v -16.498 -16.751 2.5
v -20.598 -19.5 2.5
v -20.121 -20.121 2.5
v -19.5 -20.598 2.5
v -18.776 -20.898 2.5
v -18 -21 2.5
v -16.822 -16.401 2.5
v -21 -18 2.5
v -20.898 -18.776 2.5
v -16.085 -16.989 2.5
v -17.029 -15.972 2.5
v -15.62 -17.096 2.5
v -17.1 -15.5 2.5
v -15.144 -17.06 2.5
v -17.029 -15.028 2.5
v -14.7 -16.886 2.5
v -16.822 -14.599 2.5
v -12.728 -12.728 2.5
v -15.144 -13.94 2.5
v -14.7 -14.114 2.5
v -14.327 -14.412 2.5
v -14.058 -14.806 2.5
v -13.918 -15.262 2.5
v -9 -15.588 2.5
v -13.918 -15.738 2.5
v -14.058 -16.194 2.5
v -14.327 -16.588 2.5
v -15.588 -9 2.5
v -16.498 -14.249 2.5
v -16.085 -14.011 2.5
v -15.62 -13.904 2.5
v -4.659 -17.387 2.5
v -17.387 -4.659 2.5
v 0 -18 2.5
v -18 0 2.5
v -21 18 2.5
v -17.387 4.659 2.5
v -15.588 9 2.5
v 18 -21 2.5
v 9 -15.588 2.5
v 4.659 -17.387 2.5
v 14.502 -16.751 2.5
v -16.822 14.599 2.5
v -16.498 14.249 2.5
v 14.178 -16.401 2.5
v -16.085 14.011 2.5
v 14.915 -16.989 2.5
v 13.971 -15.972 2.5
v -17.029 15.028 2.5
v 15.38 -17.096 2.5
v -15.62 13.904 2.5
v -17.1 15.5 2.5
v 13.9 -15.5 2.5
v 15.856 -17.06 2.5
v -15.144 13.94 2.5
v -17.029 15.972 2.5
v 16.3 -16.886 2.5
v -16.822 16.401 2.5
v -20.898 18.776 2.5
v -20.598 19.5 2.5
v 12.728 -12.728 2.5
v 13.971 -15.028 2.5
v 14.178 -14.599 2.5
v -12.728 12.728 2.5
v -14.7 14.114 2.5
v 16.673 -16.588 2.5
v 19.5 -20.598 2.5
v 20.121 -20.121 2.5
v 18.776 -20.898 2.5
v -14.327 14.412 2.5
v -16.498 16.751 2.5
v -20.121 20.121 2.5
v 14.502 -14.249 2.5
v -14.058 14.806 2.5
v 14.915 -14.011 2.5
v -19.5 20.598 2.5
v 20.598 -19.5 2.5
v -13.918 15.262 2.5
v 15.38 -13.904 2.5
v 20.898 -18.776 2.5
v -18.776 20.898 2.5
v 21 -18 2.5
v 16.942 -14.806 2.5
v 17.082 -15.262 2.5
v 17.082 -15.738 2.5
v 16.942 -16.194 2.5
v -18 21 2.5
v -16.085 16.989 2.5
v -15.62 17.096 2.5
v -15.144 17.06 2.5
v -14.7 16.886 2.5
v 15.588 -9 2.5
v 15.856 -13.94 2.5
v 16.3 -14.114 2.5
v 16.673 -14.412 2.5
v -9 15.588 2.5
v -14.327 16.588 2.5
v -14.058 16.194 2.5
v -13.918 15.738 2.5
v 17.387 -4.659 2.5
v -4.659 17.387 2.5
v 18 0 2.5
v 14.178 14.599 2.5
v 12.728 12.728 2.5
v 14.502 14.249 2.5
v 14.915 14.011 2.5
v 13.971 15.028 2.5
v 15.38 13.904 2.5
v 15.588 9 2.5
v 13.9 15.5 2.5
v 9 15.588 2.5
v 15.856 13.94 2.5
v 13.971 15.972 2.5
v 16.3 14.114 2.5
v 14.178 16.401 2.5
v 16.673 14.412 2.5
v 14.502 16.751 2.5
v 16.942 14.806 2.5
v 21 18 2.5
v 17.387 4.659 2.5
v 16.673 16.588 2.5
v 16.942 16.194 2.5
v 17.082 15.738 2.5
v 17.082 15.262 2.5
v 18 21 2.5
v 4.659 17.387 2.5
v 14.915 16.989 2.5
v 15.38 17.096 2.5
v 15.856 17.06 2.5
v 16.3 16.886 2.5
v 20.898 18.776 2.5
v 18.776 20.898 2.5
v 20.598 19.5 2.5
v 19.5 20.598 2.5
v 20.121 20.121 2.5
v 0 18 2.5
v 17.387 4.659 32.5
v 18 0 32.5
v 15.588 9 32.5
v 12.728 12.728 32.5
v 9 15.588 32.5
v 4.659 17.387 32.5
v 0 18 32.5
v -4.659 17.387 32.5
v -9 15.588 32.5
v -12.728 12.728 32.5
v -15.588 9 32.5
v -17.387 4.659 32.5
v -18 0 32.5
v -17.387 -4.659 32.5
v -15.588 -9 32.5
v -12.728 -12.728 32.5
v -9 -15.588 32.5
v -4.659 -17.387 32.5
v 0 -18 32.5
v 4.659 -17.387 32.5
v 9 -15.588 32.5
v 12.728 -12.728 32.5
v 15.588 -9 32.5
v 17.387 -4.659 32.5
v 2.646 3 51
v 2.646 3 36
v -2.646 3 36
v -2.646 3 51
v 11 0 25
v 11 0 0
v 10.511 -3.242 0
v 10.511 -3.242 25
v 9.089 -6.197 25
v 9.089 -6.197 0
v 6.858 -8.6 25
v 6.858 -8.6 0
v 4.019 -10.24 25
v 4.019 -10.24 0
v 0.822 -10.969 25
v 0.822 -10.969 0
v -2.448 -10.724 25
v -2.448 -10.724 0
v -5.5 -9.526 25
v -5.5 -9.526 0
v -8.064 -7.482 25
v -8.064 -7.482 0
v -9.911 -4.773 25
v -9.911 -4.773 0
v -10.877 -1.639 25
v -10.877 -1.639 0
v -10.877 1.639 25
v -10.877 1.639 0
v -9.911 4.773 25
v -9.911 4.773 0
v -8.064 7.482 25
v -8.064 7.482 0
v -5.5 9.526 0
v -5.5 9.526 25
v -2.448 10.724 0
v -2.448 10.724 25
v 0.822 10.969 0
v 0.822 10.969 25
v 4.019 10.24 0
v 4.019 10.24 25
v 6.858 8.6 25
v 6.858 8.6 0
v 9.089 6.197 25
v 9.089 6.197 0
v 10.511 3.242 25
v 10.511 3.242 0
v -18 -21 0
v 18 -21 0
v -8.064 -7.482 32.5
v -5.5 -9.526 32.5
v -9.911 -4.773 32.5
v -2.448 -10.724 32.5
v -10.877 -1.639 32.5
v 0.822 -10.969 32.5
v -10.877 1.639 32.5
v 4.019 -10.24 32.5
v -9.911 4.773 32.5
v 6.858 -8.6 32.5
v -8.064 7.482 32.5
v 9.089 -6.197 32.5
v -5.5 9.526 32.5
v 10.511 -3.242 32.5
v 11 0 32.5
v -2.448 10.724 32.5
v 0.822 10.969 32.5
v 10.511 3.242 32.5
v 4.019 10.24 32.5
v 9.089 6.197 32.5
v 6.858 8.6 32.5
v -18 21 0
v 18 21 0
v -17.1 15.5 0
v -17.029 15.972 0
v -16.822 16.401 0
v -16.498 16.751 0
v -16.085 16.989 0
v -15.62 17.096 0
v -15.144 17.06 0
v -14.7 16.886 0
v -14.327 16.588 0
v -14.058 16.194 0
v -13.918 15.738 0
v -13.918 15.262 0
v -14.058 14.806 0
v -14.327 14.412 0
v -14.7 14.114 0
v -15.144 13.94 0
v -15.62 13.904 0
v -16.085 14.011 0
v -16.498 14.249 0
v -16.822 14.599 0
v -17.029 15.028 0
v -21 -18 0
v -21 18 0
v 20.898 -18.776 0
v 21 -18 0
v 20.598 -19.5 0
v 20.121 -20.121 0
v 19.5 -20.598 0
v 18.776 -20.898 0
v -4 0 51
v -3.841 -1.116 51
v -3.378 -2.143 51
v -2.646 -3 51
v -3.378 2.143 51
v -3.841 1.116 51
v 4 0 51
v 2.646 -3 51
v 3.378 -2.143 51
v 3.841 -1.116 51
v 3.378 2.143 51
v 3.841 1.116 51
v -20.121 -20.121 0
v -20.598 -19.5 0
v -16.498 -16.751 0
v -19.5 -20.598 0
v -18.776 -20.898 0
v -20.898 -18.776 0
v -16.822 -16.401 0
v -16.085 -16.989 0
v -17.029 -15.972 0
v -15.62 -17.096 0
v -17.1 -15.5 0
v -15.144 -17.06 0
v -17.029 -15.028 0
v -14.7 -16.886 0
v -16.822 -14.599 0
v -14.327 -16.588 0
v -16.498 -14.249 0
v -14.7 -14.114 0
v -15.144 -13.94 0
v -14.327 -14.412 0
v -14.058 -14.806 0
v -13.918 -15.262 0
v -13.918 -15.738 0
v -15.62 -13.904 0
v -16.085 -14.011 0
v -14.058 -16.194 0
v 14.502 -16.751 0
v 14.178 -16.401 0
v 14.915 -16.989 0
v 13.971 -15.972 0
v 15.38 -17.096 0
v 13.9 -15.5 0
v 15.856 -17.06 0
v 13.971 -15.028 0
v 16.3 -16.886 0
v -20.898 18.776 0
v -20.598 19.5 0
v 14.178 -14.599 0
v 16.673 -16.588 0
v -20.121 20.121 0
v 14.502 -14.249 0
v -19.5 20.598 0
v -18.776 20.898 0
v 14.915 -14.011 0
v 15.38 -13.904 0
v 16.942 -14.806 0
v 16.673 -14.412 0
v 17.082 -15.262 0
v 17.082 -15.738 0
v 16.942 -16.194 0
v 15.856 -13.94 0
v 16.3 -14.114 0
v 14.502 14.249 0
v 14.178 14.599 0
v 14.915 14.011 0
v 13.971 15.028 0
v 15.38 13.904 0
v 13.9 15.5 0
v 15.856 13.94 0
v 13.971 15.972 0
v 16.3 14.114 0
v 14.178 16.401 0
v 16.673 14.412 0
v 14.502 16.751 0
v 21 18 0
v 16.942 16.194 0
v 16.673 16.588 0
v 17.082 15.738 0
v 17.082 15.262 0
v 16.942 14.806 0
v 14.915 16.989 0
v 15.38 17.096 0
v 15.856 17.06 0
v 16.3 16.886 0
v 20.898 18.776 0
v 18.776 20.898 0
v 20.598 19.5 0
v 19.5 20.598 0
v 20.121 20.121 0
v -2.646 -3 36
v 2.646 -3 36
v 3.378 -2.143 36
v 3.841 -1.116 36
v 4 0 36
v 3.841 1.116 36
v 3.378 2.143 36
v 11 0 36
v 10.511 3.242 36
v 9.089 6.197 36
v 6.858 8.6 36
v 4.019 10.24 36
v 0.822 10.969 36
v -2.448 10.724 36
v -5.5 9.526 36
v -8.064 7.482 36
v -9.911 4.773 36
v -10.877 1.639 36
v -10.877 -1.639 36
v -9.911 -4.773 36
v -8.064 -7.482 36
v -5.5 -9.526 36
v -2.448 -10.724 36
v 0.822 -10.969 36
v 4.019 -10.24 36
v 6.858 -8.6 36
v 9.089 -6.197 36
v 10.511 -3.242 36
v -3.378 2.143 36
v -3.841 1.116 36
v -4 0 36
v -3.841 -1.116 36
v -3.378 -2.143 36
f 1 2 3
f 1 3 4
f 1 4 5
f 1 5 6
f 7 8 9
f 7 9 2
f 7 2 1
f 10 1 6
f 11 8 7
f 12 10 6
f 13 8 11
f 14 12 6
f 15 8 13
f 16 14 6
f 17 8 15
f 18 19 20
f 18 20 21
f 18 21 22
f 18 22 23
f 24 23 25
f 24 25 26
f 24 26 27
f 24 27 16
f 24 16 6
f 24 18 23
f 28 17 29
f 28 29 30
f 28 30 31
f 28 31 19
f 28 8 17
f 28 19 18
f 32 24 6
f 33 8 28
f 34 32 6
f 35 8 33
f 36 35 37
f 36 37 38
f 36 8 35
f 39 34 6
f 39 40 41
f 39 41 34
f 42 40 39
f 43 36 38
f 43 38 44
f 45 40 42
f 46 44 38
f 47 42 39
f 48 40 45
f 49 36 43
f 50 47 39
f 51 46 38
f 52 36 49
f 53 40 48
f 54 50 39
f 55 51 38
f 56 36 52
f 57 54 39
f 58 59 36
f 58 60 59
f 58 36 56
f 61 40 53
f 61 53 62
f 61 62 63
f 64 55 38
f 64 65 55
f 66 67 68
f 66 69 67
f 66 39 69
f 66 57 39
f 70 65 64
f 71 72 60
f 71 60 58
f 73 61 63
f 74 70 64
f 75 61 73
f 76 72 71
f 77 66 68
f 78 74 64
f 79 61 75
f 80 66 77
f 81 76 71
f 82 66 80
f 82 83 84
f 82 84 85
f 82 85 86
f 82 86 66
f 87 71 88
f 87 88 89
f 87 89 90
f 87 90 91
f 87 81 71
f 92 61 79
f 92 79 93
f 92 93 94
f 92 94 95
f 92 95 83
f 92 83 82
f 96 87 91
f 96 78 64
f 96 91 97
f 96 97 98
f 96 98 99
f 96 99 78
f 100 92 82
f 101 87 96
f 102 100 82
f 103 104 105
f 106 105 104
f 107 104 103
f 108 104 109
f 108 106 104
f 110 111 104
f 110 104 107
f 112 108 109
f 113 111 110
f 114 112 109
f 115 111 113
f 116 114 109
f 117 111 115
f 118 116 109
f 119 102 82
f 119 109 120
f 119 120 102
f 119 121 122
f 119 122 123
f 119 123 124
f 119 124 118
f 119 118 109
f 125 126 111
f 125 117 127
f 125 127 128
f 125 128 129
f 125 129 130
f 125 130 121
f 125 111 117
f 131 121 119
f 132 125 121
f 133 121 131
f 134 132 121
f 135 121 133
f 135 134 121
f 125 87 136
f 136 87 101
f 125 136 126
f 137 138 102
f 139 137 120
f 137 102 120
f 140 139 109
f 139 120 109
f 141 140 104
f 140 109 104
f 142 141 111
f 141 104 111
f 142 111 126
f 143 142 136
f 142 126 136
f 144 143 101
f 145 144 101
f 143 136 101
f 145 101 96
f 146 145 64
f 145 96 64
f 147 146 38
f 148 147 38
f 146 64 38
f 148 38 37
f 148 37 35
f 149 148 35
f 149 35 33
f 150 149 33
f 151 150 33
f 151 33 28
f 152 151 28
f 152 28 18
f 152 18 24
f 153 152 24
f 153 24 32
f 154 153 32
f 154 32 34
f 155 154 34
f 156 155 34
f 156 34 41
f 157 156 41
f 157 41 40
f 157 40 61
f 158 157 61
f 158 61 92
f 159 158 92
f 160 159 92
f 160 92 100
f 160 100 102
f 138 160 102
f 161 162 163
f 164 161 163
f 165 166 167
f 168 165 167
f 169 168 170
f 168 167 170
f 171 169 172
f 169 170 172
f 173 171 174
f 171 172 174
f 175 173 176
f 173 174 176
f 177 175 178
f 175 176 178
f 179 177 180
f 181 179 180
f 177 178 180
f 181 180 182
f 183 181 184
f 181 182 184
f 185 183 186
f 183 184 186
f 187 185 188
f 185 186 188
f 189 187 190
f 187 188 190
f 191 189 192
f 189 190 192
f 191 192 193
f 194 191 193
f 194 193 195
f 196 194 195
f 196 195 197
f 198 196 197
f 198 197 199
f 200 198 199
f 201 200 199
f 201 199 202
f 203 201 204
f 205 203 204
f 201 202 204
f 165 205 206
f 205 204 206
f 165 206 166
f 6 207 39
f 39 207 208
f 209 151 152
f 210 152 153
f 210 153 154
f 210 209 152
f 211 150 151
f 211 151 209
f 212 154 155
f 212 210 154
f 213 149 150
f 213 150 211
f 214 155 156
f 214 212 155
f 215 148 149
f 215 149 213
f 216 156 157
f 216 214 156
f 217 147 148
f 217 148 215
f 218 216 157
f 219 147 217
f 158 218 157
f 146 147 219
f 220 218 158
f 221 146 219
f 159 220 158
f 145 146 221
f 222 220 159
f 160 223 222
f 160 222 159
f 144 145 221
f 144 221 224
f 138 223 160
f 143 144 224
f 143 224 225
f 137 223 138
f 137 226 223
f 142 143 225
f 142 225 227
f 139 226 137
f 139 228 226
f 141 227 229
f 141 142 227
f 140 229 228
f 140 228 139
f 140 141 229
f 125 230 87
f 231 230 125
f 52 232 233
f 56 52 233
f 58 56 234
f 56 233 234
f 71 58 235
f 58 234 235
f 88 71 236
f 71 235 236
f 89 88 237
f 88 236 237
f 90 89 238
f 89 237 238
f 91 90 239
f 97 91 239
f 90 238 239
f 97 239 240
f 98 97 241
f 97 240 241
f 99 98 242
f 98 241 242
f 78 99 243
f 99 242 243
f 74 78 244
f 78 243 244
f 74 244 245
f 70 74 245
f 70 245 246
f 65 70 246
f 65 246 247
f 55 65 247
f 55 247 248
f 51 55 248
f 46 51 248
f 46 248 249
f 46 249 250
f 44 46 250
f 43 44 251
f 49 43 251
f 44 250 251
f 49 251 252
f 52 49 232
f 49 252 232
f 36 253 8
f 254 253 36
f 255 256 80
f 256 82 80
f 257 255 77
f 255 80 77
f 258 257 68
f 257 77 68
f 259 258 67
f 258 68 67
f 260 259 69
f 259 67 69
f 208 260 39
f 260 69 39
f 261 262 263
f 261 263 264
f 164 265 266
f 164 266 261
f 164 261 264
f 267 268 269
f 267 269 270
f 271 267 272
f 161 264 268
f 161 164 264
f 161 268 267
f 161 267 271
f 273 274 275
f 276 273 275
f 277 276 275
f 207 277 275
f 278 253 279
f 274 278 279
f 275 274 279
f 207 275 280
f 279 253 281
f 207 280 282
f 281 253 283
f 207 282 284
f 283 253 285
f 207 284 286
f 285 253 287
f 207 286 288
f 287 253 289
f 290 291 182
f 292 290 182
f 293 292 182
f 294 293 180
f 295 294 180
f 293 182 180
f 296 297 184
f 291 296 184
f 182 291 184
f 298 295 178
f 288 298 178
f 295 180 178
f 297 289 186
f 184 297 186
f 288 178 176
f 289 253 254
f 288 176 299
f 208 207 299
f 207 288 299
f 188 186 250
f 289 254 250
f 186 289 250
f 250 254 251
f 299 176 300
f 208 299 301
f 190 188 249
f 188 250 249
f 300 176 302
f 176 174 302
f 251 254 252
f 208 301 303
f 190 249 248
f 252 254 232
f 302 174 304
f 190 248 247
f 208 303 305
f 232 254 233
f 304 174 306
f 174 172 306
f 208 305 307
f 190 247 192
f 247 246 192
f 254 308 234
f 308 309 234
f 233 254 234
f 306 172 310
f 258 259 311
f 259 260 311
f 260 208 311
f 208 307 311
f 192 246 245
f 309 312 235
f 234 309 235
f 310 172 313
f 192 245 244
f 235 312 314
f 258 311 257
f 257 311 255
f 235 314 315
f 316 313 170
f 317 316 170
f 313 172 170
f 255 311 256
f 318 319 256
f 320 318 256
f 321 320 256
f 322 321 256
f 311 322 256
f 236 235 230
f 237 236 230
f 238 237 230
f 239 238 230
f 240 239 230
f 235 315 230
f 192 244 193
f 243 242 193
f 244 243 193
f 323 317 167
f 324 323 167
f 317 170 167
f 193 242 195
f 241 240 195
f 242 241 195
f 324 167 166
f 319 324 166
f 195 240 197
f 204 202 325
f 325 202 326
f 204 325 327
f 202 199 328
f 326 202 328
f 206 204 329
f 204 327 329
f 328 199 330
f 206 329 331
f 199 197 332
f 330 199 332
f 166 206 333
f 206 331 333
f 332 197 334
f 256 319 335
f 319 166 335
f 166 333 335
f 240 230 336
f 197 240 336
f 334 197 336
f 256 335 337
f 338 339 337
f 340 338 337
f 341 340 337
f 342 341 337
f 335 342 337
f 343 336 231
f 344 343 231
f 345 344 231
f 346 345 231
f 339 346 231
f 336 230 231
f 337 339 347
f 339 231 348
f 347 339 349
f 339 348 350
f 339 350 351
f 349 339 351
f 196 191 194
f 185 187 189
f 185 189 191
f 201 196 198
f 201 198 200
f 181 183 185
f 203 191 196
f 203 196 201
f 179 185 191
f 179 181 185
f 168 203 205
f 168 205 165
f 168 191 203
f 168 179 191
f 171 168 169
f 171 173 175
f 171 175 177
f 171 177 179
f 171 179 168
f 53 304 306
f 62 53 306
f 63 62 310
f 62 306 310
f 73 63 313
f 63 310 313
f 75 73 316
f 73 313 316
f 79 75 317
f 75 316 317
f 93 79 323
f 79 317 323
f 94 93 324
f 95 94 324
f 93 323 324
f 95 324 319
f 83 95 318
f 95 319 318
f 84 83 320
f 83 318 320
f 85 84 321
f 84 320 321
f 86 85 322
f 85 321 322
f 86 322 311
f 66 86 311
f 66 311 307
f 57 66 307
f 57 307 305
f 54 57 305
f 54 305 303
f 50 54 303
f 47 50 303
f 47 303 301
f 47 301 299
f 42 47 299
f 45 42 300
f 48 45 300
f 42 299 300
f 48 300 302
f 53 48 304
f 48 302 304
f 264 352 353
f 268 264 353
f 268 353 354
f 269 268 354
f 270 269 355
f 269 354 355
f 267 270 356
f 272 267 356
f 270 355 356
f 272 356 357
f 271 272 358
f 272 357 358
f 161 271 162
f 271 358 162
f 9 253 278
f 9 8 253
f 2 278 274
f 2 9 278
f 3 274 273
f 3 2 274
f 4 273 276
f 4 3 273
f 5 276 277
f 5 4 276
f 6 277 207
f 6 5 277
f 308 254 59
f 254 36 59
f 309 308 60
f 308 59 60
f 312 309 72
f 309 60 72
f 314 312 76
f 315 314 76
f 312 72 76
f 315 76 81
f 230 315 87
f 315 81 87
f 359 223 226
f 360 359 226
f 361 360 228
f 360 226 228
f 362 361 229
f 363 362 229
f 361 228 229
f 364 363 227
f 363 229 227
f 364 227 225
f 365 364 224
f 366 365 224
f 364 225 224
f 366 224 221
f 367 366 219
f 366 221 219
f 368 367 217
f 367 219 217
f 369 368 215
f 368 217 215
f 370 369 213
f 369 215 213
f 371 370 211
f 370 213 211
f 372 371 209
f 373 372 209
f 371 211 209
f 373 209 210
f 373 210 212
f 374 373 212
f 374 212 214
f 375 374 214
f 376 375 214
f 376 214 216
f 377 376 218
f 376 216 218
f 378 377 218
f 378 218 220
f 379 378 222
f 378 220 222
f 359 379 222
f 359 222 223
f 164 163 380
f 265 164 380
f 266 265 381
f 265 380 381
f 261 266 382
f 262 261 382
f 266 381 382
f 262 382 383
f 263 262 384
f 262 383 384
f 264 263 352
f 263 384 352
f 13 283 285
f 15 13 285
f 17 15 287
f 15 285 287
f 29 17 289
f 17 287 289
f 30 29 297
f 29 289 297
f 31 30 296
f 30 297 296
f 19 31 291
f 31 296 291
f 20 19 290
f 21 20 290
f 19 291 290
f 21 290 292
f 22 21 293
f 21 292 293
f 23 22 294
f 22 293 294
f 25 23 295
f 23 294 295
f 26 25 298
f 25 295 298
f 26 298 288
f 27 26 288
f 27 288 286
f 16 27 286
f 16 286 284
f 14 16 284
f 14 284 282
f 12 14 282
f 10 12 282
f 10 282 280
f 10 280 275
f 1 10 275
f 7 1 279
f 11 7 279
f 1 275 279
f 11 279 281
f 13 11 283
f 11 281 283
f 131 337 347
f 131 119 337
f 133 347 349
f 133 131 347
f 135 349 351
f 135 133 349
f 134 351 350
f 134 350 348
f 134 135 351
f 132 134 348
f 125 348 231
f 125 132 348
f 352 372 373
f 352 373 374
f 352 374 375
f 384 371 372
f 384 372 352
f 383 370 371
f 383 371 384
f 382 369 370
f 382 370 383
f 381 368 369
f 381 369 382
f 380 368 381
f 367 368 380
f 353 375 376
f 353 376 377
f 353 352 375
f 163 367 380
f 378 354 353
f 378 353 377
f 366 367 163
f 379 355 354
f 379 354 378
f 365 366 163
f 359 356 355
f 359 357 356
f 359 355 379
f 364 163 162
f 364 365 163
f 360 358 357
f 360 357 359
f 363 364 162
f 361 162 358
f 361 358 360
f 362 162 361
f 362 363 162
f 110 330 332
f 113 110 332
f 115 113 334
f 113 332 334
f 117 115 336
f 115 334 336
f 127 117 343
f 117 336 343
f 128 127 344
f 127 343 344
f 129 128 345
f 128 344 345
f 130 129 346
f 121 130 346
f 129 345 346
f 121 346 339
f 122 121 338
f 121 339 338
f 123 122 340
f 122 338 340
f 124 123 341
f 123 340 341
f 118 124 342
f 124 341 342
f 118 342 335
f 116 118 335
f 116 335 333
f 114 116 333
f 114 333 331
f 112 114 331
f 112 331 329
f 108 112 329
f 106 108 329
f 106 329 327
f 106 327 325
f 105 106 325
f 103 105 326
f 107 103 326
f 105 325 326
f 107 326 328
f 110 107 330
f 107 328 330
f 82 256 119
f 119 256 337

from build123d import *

# Parameters (mm, degrees)
SKETCH_1_R          = 18
EXTRUDE_1_DEPTH     = 32.5
SKETCH_1_3_W        = 42
SKETCH_1_3_H        = 42
SKETCH_1_3_R        = 18
EXTRUDE_2_DEPTH     = 2.5
FILLET_1_R          = 3
SKETCH_4_R          = 1.6
CUT_EXTRUDE_1_DEPTH = 2.5
SKETCH_5_R          = 11
EXTRUDE_3_DEPTH     = 3.5
EXTRUDE_4_DEPTH     = 15
SKETCH_7_R          = 11
CUT_EXTRUDE_2_DEPTH = 25


with BuildPart() as part:
    # 草图1 → 凸台-拉伸1 (new body)
    with BuildSketch(Plane.XY):
        Circle(SKETCH_1_R)
    extrude(amount=EXTRUDE_1_DEPTH)

    # 草图1<3> → 凸台-拉伸2 (add)
    with BuildSketch(Plane.XY):
        Rectangle(SKETCH_1_3_W, SKETCH_1_3_H)
        Circle(SKETCH_1_3_R, mode=Mode.SUBTRACT)
    extrude(amount=EXTRUDE_2_DEPTH)

    # 圆角1
    fillet_1_edges = [part.edges().sort_by_distance(p)[0] for p in [
        (21, -21, 1.25),
        (-21, -21, 1.25),
        (-21, 21, 1.25),
        (21, 21, 1.25),
    ]]
    fillet(fillet_1_edges, radius=FILLET_1_R)

    # 草图4 → 切除-拉伸1 (cut)
    with BuildSketch(Plane(origin=(0, 0, 0), x_dir=(-1, 0, 0), z_dir=(0, 0, -1))):
        with Locations((-15.5, 15.5)):
            Circle(SKETCH_4_R)
        with Locations((-15.5, -15.5)):
            Circle(SKETCH_4_R)
        with Locations((15.5, -15.5)):
            Circle(SKETCH_4_R)
        with Locations((15.5, 15.5)):
            Circle(SKETCH_4_R)
    extrude(amount=-CUT_EXTRUDE_1_DEPTH, mode=Mode.SUBTRACT)

    # 草图5 → 凸台-拉伸3 (add)
    with BuildSketch(Plane.XY.offset(32.5)):
        Circle(SKETCH_5_R)
    extrude(amount=EXTRUDE_3_DEPTH)

    # 草图6 → 凸台-拉伸4 (add)
    with BuildSketch(Plane.XY.offset(36)):
        with BuildLine():
            Line((-2.645751311, -3), (2.645751311, -3))
            ThreePointArc((2.645751311, -3), (4, 0), (2.645751311, 3))
            Line((2.645751311, 3), (-2.645751311, 3))
            ThreePointArc((-2.645751311, 3), (-4, 0), (-2.645751311, -3))
        make_face()
    extrude(amount=EXTRUDE_4_DEPTH)

    # 草图7 → 切除-拉伸2 (cut)
    with BuildSketch(Plane(origin=(0, 0, 0), x_dir=(-1, 0, 0), z_dir=(0, 0, -1))):
        Circle(SKETCH_7_R)
    extrude(amount=-CUT_EXTRUDE_2_DEPTH, mode=Mode.SUBTRACT)


solid = part.part
